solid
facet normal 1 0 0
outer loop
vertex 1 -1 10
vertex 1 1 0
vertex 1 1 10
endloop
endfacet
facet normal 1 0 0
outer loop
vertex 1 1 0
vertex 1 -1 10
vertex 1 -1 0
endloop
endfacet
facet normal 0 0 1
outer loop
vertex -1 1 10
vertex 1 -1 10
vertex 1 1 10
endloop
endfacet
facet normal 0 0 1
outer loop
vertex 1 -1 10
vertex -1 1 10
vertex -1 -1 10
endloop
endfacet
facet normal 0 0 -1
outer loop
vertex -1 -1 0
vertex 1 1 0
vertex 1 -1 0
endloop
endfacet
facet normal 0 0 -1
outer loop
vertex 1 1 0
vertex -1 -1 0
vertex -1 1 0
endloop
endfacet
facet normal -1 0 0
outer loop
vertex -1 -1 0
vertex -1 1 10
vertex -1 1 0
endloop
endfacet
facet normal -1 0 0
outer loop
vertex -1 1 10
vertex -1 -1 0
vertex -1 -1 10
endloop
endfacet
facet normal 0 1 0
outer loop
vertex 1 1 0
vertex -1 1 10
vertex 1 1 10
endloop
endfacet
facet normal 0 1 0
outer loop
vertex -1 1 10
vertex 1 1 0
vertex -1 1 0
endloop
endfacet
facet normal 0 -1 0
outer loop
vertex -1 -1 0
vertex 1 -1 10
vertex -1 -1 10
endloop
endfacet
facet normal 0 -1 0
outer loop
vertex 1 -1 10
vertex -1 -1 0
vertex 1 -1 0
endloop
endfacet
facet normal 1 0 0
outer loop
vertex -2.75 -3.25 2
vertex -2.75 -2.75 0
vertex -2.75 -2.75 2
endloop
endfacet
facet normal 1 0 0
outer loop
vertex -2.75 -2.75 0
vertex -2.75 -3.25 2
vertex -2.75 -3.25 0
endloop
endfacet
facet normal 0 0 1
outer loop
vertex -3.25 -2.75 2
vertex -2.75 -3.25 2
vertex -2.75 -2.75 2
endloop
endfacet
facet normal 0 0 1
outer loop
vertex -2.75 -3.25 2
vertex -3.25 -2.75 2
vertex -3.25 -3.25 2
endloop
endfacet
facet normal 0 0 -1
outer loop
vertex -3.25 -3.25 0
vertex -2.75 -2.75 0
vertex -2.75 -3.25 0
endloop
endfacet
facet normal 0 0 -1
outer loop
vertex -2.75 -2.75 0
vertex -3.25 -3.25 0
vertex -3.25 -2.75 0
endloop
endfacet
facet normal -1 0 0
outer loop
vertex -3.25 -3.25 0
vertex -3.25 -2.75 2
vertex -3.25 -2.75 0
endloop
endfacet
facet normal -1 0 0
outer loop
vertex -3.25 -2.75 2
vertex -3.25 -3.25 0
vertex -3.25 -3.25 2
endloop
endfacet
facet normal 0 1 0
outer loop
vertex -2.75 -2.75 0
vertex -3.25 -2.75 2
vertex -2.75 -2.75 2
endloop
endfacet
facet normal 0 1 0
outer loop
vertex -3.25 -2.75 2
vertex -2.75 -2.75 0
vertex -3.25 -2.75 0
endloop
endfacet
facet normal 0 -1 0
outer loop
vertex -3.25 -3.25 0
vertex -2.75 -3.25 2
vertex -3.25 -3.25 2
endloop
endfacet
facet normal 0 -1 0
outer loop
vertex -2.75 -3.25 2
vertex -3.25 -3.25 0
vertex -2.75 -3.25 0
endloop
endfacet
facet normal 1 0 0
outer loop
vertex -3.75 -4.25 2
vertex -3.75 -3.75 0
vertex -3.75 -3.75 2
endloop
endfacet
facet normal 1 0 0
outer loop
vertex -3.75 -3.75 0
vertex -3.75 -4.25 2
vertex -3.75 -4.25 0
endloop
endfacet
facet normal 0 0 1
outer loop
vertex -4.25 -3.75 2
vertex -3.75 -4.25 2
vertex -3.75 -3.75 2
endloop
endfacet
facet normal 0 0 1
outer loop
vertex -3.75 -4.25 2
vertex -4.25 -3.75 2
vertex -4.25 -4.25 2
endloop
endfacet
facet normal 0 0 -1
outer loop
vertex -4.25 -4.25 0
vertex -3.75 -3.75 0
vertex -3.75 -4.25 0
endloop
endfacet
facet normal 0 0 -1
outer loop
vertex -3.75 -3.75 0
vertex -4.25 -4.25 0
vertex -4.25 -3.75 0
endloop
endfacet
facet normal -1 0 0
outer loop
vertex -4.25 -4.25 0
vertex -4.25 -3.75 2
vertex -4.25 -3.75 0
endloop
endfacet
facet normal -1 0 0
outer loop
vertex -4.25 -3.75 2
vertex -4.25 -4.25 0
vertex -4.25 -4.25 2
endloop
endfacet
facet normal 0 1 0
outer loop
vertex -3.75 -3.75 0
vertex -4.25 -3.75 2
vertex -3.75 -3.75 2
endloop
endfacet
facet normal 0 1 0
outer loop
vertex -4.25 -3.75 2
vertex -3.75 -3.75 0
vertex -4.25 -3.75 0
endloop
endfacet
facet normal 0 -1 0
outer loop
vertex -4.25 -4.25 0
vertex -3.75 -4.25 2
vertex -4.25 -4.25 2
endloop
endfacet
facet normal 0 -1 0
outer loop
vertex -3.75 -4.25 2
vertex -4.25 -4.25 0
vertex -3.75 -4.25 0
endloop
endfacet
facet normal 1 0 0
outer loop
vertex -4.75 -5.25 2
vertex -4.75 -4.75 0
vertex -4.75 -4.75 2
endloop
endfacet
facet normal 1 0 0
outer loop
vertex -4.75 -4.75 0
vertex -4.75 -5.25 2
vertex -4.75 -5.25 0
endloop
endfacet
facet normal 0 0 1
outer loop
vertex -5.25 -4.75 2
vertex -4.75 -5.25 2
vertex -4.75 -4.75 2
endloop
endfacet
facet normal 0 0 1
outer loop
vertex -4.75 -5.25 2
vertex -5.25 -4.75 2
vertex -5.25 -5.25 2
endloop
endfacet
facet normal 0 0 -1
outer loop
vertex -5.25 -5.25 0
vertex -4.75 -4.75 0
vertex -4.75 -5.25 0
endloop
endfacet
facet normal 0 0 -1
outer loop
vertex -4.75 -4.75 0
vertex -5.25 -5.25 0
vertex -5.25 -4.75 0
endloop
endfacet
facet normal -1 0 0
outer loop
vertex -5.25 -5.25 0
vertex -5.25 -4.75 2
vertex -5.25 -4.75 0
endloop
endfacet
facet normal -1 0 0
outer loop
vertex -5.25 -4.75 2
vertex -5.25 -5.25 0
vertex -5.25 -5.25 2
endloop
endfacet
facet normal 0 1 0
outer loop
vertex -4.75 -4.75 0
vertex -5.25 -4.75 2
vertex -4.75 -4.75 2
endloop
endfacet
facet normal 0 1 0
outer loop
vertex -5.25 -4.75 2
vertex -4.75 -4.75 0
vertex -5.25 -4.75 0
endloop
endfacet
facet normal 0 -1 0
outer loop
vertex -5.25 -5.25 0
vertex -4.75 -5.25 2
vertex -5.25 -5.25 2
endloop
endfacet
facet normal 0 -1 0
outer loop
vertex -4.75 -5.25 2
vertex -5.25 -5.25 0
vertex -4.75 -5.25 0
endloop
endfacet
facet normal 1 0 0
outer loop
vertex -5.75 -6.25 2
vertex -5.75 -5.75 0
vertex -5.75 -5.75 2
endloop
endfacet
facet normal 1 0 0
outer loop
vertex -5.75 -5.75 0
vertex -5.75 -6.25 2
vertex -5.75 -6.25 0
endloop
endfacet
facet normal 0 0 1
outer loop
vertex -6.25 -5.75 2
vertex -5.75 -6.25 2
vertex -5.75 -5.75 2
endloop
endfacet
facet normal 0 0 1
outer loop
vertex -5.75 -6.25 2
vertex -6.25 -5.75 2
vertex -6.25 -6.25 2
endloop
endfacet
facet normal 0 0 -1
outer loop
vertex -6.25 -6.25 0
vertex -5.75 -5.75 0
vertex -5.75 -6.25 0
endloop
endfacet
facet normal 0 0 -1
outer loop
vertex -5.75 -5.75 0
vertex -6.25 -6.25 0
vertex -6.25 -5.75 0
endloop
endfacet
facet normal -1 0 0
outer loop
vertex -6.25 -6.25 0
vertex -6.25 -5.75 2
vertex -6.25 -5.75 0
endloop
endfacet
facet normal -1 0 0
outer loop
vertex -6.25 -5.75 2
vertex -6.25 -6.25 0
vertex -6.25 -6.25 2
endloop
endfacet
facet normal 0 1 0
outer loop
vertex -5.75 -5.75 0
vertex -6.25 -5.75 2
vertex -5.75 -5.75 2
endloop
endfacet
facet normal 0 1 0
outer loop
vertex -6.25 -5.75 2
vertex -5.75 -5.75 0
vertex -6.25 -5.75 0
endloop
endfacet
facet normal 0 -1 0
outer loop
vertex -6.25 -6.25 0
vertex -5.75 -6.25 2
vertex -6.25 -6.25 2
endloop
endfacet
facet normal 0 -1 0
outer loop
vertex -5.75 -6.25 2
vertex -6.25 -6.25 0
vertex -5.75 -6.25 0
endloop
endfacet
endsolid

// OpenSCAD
translate([0, 0, 5]) color([0,1,0,0.9]) cube([2, 2, 10], center=true);
translate([-3.0, -3.0, 1]) color([1,0,0]) cube([0.5, 0.5, 2], center=true);
translate([-4.0, -4.0, 1]) color([1,0,0]) cube([0.5, 0.5, 2], center=true);
translate([-5.0, -5.0, 1]) color([1,0,0]) cube([0.5, 0.5, 2], center=true);
translate([-6.0, -6.0, 1]) color([1,0,0]) cube([0.5, 0.5, 2], center=true);
